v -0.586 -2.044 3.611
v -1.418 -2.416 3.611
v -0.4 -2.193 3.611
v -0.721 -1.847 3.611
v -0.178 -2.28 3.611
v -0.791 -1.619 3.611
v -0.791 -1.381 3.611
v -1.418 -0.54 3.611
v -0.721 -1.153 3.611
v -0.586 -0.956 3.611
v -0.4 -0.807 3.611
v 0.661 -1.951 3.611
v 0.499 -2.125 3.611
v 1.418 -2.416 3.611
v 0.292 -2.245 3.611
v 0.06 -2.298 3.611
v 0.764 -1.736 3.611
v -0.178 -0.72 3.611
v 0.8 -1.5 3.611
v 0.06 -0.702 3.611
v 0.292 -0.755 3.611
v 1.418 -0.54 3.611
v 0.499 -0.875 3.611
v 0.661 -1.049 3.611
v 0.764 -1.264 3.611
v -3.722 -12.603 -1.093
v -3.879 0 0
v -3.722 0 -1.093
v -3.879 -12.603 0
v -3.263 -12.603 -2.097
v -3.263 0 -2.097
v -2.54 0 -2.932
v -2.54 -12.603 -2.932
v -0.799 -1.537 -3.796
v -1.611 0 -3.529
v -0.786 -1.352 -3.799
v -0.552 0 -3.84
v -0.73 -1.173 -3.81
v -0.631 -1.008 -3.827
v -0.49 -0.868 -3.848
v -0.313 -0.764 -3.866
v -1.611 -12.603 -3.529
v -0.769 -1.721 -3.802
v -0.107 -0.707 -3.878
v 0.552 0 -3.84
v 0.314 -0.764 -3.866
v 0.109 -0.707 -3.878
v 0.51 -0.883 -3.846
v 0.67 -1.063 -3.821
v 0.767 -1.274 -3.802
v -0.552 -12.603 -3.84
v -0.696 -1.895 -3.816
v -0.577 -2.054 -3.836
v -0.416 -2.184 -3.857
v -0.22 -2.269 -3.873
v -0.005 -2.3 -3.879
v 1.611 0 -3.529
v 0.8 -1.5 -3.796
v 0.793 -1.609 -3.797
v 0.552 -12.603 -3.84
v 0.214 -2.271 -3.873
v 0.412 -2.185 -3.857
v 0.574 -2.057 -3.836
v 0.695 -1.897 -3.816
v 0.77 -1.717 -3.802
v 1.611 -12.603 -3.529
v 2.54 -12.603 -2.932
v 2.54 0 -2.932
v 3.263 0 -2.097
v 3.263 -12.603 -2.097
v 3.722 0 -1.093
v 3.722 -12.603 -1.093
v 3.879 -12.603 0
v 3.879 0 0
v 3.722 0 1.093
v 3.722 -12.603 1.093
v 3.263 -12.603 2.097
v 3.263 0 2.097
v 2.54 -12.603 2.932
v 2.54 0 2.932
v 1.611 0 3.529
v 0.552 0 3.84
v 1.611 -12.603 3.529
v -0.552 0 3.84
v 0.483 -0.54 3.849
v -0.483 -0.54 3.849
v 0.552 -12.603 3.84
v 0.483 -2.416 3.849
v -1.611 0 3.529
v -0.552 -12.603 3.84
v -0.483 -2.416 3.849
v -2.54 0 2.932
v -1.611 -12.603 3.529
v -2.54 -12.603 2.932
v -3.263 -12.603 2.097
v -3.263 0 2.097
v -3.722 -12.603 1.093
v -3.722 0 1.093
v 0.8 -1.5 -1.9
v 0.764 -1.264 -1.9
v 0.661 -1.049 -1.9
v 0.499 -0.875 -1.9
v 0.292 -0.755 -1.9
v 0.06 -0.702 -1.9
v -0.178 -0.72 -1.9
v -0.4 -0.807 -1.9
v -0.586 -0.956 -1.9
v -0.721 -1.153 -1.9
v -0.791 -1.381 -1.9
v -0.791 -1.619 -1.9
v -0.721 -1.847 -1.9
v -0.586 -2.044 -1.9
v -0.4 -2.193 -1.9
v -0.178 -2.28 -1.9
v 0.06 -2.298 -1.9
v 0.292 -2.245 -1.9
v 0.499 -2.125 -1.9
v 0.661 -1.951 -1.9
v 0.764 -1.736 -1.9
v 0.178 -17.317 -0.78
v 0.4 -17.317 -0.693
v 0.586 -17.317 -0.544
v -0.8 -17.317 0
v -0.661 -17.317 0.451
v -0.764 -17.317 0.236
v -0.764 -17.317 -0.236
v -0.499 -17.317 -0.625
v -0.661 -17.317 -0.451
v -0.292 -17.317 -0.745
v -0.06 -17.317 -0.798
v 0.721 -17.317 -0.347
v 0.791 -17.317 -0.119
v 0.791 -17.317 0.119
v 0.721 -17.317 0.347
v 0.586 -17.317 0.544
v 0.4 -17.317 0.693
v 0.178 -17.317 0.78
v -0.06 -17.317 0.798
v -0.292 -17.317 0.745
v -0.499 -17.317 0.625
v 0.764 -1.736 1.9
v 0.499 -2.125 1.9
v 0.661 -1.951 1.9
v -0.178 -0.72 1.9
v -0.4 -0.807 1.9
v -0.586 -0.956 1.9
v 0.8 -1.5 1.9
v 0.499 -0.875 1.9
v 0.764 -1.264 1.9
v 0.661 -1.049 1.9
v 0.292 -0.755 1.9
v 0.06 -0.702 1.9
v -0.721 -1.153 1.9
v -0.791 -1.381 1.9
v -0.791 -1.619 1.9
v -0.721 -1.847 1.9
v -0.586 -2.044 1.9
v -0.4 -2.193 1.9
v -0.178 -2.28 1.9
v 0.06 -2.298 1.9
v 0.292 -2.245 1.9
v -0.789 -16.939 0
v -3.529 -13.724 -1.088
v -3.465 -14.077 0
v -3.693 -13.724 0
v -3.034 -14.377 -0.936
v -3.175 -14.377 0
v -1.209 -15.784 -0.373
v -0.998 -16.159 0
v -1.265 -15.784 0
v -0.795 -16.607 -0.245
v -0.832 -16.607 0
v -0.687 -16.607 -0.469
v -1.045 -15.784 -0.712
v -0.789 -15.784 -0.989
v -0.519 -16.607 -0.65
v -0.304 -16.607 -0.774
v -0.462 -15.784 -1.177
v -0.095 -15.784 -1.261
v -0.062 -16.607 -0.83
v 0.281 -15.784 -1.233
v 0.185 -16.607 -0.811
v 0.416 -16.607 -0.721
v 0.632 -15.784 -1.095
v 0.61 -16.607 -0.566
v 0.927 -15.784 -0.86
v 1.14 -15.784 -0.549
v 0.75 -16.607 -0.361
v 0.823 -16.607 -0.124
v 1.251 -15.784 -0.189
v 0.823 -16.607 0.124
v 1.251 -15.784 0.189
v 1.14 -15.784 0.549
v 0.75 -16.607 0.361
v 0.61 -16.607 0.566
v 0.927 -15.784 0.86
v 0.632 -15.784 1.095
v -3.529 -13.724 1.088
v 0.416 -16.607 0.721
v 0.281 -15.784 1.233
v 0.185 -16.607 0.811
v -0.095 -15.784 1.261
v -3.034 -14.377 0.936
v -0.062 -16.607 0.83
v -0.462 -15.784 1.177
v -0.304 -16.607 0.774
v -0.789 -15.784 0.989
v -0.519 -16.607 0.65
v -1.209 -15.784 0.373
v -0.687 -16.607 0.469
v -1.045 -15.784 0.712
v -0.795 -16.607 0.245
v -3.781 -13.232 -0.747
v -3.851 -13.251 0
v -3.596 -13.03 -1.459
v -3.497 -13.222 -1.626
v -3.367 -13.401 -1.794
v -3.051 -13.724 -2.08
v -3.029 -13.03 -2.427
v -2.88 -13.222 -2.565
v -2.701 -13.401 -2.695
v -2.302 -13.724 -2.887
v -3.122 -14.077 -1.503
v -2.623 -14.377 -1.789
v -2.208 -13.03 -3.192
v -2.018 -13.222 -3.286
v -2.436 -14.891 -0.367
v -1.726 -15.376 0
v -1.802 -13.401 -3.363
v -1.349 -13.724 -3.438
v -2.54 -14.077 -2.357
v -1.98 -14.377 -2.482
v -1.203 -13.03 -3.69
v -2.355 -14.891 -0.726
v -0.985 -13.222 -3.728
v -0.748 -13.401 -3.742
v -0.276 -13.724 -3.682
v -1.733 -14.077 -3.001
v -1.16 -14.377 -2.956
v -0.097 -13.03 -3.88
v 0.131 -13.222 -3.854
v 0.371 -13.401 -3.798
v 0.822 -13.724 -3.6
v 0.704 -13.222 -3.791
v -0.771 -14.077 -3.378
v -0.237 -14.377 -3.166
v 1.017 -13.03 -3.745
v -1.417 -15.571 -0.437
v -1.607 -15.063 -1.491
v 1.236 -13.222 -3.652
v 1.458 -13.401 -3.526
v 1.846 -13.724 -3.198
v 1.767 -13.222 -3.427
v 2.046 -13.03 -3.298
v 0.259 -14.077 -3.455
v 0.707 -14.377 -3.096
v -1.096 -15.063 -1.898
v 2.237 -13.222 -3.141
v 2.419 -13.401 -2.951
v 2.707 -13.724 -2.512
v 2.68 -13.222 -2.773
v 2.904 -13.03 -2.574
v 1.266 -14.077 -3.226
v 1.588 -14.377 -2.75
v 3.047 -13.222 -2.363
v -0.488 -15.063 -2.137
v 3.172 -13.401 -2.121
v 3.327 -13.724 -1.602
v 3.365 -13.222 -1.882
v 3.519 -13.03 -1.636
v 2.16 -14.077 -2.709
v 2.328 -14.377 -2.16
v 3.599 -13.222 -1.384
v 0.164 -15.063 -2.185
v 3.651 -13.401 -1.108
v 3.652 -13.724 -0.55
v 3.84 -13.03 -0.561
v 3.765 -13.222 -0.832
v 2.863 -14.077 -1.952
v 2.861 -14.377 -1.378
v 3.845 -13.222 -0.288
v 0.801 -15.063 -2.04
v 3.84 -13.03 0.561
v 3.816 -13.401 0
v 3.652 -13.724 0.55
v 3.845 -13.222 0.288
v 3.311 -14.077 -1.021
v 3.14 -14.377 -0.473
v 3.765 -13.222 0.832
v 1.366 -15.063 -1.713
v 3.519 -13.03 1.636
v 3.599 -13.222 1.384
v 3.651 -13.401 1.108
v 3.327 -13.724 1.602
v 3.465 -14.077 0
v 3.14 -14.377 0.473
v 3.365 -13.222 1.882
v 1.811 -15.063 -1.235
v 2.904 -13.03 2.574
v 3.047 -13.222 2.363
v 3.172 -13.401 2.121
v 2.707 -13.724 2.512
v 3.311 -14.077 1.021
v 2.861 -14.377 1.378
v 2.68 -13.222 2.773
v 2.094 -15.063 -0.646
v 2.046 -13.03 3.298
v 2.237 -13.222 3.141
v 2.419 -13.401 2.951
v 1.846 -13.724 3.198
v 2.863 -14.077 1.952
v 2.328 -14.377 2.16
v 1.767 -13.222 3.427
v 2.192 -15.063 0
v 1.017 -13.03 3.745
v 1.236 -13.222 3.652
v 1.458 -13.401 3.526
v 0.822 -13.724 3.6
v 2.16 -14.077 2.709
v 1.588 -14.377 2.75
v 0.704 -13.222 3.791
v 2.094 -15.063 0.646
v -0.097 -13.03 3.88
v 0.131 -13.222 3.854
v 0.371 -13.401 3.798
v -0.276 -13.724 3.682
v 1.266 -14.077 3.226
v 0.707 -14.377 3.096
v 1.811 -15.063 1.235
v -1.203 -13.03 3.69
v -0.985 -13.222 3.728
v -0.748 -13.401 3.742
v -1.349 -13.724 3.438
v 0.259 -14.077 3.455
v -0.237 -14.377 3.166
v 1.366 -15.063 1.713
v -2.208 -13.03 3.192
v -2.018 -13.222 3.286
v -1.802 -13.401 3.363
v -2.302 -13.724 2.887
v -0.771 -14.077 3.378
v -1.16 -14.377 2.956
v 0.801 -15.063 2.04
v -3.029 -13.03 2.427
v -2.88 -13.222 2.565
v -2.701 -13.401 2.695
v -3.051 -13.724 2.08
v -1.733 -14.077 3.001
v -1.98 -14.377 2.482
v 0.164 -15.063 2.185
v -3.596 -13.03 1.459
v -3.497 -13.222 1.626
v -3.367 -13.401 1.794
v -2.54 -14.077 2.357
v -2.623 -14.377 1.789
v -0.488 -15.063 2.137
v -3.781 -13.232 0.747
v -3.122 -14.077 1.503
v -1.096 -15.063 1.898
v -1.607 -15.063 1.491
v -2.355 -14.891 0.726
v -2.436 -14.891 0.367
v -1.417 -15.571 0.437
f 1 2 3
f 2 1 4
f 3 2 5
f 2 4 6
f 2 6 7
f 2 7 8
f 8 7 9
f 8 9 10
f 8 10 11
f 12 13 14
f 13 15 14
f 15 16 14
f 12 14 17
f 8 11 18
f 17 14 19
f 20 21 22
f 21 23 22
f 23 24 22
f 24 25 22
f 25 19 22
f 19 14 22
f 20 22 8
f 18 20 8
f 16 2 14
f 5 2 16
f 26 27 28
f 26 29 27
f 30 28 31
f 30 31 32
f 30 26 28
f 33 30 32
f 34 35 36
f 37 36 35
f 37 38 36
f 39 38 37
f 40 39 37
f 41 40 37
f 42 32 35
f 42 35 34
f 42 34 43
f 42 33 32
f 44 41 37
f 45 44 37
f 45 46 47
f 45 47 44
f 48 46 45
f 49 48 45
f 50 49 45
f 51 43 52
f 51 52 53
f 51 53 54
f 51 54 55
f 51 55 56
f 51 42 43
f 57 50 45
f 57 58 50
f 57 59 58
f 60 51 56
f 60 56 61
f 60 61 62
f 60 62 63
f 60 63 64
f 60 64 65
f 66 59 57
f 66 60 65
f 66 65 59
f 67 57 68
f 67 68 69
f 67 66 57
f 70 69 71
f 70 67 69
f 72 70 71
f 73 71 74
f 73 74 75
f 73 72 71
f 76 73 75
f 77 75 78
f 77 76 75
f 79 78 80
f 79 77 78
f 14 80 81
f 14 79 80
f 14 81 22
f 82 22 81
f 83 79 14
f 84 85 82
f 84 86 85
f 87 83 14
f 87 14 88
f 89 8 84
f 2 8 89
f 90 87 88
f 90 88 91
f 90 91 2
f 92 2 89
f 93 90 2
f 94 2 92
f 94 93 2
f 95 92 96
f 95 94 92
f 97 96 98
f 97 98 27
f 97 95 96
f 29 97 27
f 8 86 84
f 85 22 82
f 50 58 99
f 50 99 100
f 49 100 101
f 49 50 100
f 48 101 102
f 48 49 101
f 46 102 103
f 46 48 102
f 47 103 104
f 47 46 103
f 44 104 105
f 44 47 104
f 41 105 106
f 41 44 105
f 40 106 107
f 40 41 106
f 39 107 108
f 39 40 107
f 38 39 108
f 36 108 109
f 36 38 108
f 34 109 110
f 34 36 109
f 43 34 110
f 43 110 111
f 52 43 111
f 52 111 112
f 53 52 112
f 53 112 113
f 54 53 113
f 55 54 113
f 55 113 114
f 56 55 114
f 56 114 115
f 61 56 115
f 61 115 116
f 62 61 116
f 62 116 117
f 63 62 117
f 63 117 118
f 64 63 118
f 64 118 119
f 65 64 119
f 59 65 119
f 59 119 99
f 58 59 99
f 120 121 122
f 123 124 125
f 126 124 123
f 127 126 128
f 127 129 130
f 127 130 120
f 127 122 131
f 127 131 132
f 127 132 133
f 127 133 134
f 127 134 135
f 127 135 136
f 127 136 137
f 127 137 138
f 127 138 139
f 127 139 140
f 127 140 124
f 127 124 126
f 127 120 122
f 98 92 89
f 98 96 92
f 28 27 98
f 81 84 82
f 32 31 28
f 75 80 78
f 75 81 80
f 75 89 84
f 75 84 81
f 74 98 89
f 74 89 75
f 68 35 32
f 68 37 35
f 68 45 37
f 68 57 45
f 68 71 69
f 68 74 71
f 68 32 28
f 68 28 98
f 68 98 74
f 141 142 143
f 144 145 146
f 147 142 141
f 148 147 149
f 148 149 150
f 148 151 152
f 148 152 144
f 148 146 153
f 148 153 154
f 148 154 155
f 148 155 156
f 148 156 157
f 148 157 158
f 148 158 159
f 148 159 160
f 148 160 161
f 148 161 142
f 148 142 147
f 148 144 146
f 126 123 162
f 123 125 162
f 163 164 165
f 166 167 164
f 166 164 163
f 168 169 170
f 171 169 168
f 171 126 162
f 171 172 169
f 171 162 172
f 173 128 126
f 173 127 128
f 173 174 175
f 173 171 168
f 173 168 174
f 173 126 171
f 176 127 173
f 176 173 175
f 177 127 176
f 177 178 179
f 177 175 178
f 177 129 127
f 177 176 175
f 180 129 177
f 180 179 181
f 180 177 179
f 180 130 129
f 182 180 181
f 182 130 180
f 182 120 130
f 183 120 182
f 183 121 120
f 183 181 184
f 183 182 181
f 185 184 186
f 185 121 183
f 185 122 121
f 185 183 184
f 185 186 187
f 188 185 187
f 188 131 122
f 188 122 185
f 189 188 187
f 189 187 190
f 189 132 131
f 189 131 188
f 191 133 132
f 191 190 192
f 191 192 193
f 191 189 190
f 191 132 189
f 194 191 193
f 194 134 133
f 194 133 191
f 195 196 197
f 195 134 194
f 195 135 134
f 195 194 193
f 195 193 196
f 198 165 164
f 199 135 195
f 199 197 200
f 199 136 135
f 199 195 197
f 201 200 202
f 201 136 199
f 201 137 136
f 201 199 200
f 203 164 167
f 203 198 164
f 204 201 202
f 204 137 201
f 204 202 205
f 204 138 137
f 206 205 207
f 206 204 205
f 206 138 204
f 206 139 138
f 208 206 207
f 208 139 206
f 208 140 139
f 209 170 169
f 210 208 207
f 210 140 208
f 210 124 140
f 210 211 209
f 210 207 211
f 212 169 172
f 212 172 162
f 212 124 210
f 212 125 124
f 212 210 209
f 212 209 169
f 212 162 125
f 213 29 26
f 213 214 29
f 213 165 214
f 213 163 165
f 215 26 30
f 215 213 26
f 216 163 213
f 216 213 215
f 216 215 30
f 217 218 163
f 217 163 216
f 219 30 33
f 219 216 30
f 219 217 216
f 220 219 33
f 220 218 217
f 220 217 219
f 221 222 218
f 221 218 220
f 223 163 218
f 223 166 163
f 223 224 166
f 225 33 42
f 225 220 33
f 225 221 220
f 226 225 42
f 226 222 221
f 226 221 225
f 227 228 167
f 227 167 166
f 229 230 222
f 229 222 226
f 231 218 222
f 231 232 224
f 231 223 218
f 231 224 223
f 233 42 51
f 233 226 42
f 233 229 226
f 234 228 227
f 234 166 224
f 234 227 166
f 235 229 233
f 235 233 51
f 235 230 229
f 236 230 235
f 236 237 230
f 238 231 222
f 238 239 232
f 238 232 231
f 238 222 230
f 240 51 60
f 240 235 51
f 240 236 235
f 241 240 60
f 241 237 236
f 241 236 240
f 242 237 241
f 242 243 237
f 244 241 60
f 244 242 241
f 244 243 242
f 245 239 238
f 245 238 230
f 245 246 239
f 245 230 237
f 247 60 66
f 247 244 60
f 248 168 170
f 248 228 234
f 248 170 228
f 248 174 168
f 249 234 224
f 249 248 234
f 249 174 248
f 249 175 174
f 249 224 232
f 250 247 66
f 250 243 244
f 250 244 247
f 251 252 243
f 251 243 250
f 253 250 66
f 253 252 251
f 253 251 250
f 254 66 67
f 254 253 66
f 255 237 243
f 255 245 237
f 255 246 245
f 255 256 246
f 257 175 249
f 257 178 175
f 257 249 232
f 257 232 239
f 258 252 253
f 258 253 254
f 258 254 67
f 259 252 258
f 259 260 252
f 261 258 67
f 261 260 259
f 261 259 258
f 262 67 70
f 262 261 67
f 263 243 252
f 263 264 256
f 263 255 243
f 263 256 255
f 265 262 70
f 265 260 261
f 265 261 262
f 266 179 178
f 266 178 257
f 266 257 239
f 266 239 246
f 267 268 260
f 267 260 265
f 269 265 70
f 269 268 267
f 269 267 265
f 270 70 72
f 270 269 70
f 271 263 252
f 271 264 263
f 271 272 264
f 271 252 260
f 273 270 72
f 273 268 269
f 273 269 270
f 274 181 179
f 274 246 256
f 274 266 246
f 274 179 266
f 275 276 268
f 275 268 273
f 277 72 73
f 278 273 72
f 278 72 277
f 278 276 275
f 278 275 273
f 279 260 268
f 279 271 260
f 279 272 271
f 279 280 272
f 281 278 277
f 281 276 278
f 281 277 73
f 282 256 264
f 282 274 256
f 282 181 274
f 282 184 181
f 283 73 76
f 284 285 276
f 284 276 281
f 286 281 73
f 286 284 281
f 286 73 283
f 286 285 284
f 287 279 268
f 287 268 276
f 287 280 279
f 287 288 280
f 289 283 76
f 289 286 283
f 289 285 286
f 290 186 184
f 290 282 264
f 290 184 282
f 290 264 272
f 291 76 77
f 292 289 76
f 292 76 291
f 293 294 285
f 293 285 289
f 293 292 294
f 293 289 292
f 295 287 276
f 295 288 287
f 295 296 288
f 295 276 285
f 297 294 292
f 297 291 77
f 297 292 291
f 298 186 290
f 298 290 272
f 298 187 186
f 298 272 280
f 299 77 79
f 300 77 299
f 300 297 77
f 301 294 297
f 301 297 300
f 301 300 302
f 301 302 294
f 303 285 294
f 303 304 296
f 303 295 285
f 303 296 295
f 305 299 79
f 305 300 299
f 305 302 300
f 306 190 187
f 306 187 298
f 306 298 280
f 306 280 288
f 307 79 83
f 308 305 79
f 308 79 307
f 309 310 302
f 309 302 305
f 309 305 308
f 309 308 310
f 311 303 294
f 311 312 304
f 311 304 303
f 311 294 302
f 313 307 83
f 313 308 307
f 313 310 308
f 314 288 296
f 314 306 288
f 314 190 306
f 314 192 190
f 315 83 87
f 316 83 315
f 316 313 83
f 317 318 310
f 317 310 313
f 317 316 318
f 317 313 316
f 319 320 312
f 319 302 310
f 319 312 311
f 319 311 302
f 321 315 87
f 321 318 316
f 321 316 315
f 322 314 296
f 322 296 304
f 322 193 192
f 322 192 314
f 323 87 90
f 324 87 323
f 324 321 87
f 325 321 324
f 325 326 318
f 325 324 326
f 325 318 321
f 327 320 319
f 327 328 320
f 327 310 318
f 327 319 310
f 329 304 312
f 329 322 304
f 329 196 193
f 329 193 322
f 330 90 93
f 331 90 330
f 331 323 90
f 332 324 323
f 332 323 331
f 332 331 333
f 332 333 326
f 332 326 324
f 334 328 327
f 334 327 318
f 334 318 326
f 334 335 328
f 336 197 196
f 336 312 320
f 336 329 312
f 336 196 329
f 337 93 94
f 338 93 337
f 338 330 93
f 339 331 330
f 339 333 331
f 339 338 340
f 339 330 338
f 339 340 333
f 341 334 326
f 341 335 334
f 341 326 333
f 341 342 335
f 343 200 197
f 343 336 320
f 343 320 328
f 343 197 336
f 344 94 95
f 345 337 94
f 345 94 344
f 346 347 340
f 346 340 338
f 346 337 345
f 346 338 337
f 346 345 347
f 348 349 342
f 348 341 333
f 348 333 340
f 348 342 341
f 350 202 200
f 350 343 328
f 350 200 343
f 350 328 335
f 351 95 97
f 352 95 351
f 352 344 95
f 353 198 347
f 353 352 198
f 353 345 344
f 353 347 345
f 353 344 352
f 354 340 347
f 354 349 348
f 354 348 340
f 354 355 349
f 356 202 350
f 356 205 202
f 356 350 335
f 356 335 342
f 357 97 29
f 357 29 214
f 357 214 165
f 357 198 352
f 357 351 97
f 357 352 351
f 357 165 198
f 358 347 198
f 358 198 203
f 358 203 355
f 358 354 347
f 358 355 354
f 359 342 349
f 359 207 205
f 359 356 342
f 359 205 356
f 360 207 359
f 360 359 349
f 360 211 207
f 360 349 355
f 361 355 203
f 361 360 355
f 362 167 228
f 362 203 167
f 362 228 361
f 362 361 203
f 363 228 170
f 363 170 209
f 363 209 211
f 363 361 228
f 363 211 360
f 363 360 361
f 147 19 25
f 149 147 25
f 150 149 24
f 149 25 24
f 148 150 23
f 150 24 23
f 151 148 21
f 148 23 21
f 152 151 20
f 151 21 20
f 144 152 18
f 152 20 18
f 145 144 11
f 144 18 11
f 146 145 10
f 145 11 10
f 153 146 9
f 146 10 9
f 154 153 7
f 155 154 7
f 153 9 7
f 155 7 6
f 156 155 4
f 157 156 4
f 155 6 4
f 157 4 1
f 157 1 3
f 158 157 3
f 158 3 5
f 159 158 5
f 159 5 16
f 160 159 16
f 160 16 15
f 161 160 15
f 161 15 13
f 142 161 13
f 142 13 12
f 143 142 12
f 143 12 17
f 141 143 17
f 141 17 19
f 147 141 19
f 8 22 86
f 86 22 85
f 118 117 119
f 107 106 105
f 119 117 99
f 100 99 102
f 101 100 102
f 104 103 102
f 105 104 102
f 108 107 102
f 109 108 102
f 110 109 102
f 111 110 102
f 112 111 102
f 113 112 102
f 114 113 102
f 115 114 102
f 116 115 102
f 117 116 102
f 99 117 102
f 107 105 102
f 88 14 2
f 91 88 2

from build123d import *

# Parameters (mm, degrees)
SKETCH3_R               = 0.8
CUT_EXTRUDE1_DEPTH      = 2
CUT_EXTRUDE2_START      = 2
SKETCH4_R               = 0.8
CUT_EXTRUDE2_DEPTH      = 2
CUT_EXTRUDE3_DEPTH      = 5
CUT_EXTRUDE3_DEPTH_BACK = 5
SKETCH6_W               = 0.268563898
SKETCH6_H               = 1.87642035


with BuildPart() as part:
    # Sketch1 → Revolve1 (revolve)
    with BuildSketch(Plane.XY):
        with BuildLine():
            Line((-3.879111396, 0), (-3.879111396, -12))
            Line((-3.879111396, -12), (-3.879111396, -12.602750297))
            add(Edge.make_bspline(
                [(-3.879111396, -12.602750297), (-4.098454424, -15.2494219), (-0.534839258, -14.725941394), (-0.8, -17.31657115)],
                knots=[0, 0, 0, 0, 1, 1, 1, 1], degree=3))
            Line((-0.8, -17.31657115), (0, -17.31657115))
            Line((0, -17.31657115), (0, 0))
            Line((0, 0), (-3.879111396, 0))
        make_face()
    revolve(axis=Axis((0, 0, 0), (0, -1, 0)))

    # Sketch3 → Cut-Extrude1 (cut)
    with BuildSketch(Plane.XY.offset(3.9)):
        with Locations((0, -1.5)):
            Circle(SKETCH3_R)
    extrude(amount=-CUT_EXTRUDE1_DEPTH, mode=Mode.SUBTRACT)

    # Sketch4 → Cut-Extrude2 (cut)
    with BuildSketch(Plane.XY.offset(-3.9).offset(CUT_EXTRUDE2_START)):
        with Locations((0, -1.5)):
            Circle(SKETCH4_R)
    extrude(amount=-CUT_EXTRUDE2_DEPTH, mode=Mode.SUBTRACT)

    # Sketch6 → Cut-Extrude3 (cut, two sides: drawn at the far end of the back side and taken through both)
    with BuildSketch(Plane(origin=(0, 0, 0), x_dir=(0, 0, -1), z_dir=(1, 0, 0)).offset(-CUT_EXTRUDE3_DEPTH_BACK)):
        with Locations((-3.744829447, -1.477966688)):
            Rectangle(SKETCH6_W, SKETCH6_H)
    extrude(amount=CUT_EXTRUDE3_DEPTH + CUT_EXTRUDE3_DEPTH_BACK, mode=Mode.SUBTRACT)


solid = part.part
